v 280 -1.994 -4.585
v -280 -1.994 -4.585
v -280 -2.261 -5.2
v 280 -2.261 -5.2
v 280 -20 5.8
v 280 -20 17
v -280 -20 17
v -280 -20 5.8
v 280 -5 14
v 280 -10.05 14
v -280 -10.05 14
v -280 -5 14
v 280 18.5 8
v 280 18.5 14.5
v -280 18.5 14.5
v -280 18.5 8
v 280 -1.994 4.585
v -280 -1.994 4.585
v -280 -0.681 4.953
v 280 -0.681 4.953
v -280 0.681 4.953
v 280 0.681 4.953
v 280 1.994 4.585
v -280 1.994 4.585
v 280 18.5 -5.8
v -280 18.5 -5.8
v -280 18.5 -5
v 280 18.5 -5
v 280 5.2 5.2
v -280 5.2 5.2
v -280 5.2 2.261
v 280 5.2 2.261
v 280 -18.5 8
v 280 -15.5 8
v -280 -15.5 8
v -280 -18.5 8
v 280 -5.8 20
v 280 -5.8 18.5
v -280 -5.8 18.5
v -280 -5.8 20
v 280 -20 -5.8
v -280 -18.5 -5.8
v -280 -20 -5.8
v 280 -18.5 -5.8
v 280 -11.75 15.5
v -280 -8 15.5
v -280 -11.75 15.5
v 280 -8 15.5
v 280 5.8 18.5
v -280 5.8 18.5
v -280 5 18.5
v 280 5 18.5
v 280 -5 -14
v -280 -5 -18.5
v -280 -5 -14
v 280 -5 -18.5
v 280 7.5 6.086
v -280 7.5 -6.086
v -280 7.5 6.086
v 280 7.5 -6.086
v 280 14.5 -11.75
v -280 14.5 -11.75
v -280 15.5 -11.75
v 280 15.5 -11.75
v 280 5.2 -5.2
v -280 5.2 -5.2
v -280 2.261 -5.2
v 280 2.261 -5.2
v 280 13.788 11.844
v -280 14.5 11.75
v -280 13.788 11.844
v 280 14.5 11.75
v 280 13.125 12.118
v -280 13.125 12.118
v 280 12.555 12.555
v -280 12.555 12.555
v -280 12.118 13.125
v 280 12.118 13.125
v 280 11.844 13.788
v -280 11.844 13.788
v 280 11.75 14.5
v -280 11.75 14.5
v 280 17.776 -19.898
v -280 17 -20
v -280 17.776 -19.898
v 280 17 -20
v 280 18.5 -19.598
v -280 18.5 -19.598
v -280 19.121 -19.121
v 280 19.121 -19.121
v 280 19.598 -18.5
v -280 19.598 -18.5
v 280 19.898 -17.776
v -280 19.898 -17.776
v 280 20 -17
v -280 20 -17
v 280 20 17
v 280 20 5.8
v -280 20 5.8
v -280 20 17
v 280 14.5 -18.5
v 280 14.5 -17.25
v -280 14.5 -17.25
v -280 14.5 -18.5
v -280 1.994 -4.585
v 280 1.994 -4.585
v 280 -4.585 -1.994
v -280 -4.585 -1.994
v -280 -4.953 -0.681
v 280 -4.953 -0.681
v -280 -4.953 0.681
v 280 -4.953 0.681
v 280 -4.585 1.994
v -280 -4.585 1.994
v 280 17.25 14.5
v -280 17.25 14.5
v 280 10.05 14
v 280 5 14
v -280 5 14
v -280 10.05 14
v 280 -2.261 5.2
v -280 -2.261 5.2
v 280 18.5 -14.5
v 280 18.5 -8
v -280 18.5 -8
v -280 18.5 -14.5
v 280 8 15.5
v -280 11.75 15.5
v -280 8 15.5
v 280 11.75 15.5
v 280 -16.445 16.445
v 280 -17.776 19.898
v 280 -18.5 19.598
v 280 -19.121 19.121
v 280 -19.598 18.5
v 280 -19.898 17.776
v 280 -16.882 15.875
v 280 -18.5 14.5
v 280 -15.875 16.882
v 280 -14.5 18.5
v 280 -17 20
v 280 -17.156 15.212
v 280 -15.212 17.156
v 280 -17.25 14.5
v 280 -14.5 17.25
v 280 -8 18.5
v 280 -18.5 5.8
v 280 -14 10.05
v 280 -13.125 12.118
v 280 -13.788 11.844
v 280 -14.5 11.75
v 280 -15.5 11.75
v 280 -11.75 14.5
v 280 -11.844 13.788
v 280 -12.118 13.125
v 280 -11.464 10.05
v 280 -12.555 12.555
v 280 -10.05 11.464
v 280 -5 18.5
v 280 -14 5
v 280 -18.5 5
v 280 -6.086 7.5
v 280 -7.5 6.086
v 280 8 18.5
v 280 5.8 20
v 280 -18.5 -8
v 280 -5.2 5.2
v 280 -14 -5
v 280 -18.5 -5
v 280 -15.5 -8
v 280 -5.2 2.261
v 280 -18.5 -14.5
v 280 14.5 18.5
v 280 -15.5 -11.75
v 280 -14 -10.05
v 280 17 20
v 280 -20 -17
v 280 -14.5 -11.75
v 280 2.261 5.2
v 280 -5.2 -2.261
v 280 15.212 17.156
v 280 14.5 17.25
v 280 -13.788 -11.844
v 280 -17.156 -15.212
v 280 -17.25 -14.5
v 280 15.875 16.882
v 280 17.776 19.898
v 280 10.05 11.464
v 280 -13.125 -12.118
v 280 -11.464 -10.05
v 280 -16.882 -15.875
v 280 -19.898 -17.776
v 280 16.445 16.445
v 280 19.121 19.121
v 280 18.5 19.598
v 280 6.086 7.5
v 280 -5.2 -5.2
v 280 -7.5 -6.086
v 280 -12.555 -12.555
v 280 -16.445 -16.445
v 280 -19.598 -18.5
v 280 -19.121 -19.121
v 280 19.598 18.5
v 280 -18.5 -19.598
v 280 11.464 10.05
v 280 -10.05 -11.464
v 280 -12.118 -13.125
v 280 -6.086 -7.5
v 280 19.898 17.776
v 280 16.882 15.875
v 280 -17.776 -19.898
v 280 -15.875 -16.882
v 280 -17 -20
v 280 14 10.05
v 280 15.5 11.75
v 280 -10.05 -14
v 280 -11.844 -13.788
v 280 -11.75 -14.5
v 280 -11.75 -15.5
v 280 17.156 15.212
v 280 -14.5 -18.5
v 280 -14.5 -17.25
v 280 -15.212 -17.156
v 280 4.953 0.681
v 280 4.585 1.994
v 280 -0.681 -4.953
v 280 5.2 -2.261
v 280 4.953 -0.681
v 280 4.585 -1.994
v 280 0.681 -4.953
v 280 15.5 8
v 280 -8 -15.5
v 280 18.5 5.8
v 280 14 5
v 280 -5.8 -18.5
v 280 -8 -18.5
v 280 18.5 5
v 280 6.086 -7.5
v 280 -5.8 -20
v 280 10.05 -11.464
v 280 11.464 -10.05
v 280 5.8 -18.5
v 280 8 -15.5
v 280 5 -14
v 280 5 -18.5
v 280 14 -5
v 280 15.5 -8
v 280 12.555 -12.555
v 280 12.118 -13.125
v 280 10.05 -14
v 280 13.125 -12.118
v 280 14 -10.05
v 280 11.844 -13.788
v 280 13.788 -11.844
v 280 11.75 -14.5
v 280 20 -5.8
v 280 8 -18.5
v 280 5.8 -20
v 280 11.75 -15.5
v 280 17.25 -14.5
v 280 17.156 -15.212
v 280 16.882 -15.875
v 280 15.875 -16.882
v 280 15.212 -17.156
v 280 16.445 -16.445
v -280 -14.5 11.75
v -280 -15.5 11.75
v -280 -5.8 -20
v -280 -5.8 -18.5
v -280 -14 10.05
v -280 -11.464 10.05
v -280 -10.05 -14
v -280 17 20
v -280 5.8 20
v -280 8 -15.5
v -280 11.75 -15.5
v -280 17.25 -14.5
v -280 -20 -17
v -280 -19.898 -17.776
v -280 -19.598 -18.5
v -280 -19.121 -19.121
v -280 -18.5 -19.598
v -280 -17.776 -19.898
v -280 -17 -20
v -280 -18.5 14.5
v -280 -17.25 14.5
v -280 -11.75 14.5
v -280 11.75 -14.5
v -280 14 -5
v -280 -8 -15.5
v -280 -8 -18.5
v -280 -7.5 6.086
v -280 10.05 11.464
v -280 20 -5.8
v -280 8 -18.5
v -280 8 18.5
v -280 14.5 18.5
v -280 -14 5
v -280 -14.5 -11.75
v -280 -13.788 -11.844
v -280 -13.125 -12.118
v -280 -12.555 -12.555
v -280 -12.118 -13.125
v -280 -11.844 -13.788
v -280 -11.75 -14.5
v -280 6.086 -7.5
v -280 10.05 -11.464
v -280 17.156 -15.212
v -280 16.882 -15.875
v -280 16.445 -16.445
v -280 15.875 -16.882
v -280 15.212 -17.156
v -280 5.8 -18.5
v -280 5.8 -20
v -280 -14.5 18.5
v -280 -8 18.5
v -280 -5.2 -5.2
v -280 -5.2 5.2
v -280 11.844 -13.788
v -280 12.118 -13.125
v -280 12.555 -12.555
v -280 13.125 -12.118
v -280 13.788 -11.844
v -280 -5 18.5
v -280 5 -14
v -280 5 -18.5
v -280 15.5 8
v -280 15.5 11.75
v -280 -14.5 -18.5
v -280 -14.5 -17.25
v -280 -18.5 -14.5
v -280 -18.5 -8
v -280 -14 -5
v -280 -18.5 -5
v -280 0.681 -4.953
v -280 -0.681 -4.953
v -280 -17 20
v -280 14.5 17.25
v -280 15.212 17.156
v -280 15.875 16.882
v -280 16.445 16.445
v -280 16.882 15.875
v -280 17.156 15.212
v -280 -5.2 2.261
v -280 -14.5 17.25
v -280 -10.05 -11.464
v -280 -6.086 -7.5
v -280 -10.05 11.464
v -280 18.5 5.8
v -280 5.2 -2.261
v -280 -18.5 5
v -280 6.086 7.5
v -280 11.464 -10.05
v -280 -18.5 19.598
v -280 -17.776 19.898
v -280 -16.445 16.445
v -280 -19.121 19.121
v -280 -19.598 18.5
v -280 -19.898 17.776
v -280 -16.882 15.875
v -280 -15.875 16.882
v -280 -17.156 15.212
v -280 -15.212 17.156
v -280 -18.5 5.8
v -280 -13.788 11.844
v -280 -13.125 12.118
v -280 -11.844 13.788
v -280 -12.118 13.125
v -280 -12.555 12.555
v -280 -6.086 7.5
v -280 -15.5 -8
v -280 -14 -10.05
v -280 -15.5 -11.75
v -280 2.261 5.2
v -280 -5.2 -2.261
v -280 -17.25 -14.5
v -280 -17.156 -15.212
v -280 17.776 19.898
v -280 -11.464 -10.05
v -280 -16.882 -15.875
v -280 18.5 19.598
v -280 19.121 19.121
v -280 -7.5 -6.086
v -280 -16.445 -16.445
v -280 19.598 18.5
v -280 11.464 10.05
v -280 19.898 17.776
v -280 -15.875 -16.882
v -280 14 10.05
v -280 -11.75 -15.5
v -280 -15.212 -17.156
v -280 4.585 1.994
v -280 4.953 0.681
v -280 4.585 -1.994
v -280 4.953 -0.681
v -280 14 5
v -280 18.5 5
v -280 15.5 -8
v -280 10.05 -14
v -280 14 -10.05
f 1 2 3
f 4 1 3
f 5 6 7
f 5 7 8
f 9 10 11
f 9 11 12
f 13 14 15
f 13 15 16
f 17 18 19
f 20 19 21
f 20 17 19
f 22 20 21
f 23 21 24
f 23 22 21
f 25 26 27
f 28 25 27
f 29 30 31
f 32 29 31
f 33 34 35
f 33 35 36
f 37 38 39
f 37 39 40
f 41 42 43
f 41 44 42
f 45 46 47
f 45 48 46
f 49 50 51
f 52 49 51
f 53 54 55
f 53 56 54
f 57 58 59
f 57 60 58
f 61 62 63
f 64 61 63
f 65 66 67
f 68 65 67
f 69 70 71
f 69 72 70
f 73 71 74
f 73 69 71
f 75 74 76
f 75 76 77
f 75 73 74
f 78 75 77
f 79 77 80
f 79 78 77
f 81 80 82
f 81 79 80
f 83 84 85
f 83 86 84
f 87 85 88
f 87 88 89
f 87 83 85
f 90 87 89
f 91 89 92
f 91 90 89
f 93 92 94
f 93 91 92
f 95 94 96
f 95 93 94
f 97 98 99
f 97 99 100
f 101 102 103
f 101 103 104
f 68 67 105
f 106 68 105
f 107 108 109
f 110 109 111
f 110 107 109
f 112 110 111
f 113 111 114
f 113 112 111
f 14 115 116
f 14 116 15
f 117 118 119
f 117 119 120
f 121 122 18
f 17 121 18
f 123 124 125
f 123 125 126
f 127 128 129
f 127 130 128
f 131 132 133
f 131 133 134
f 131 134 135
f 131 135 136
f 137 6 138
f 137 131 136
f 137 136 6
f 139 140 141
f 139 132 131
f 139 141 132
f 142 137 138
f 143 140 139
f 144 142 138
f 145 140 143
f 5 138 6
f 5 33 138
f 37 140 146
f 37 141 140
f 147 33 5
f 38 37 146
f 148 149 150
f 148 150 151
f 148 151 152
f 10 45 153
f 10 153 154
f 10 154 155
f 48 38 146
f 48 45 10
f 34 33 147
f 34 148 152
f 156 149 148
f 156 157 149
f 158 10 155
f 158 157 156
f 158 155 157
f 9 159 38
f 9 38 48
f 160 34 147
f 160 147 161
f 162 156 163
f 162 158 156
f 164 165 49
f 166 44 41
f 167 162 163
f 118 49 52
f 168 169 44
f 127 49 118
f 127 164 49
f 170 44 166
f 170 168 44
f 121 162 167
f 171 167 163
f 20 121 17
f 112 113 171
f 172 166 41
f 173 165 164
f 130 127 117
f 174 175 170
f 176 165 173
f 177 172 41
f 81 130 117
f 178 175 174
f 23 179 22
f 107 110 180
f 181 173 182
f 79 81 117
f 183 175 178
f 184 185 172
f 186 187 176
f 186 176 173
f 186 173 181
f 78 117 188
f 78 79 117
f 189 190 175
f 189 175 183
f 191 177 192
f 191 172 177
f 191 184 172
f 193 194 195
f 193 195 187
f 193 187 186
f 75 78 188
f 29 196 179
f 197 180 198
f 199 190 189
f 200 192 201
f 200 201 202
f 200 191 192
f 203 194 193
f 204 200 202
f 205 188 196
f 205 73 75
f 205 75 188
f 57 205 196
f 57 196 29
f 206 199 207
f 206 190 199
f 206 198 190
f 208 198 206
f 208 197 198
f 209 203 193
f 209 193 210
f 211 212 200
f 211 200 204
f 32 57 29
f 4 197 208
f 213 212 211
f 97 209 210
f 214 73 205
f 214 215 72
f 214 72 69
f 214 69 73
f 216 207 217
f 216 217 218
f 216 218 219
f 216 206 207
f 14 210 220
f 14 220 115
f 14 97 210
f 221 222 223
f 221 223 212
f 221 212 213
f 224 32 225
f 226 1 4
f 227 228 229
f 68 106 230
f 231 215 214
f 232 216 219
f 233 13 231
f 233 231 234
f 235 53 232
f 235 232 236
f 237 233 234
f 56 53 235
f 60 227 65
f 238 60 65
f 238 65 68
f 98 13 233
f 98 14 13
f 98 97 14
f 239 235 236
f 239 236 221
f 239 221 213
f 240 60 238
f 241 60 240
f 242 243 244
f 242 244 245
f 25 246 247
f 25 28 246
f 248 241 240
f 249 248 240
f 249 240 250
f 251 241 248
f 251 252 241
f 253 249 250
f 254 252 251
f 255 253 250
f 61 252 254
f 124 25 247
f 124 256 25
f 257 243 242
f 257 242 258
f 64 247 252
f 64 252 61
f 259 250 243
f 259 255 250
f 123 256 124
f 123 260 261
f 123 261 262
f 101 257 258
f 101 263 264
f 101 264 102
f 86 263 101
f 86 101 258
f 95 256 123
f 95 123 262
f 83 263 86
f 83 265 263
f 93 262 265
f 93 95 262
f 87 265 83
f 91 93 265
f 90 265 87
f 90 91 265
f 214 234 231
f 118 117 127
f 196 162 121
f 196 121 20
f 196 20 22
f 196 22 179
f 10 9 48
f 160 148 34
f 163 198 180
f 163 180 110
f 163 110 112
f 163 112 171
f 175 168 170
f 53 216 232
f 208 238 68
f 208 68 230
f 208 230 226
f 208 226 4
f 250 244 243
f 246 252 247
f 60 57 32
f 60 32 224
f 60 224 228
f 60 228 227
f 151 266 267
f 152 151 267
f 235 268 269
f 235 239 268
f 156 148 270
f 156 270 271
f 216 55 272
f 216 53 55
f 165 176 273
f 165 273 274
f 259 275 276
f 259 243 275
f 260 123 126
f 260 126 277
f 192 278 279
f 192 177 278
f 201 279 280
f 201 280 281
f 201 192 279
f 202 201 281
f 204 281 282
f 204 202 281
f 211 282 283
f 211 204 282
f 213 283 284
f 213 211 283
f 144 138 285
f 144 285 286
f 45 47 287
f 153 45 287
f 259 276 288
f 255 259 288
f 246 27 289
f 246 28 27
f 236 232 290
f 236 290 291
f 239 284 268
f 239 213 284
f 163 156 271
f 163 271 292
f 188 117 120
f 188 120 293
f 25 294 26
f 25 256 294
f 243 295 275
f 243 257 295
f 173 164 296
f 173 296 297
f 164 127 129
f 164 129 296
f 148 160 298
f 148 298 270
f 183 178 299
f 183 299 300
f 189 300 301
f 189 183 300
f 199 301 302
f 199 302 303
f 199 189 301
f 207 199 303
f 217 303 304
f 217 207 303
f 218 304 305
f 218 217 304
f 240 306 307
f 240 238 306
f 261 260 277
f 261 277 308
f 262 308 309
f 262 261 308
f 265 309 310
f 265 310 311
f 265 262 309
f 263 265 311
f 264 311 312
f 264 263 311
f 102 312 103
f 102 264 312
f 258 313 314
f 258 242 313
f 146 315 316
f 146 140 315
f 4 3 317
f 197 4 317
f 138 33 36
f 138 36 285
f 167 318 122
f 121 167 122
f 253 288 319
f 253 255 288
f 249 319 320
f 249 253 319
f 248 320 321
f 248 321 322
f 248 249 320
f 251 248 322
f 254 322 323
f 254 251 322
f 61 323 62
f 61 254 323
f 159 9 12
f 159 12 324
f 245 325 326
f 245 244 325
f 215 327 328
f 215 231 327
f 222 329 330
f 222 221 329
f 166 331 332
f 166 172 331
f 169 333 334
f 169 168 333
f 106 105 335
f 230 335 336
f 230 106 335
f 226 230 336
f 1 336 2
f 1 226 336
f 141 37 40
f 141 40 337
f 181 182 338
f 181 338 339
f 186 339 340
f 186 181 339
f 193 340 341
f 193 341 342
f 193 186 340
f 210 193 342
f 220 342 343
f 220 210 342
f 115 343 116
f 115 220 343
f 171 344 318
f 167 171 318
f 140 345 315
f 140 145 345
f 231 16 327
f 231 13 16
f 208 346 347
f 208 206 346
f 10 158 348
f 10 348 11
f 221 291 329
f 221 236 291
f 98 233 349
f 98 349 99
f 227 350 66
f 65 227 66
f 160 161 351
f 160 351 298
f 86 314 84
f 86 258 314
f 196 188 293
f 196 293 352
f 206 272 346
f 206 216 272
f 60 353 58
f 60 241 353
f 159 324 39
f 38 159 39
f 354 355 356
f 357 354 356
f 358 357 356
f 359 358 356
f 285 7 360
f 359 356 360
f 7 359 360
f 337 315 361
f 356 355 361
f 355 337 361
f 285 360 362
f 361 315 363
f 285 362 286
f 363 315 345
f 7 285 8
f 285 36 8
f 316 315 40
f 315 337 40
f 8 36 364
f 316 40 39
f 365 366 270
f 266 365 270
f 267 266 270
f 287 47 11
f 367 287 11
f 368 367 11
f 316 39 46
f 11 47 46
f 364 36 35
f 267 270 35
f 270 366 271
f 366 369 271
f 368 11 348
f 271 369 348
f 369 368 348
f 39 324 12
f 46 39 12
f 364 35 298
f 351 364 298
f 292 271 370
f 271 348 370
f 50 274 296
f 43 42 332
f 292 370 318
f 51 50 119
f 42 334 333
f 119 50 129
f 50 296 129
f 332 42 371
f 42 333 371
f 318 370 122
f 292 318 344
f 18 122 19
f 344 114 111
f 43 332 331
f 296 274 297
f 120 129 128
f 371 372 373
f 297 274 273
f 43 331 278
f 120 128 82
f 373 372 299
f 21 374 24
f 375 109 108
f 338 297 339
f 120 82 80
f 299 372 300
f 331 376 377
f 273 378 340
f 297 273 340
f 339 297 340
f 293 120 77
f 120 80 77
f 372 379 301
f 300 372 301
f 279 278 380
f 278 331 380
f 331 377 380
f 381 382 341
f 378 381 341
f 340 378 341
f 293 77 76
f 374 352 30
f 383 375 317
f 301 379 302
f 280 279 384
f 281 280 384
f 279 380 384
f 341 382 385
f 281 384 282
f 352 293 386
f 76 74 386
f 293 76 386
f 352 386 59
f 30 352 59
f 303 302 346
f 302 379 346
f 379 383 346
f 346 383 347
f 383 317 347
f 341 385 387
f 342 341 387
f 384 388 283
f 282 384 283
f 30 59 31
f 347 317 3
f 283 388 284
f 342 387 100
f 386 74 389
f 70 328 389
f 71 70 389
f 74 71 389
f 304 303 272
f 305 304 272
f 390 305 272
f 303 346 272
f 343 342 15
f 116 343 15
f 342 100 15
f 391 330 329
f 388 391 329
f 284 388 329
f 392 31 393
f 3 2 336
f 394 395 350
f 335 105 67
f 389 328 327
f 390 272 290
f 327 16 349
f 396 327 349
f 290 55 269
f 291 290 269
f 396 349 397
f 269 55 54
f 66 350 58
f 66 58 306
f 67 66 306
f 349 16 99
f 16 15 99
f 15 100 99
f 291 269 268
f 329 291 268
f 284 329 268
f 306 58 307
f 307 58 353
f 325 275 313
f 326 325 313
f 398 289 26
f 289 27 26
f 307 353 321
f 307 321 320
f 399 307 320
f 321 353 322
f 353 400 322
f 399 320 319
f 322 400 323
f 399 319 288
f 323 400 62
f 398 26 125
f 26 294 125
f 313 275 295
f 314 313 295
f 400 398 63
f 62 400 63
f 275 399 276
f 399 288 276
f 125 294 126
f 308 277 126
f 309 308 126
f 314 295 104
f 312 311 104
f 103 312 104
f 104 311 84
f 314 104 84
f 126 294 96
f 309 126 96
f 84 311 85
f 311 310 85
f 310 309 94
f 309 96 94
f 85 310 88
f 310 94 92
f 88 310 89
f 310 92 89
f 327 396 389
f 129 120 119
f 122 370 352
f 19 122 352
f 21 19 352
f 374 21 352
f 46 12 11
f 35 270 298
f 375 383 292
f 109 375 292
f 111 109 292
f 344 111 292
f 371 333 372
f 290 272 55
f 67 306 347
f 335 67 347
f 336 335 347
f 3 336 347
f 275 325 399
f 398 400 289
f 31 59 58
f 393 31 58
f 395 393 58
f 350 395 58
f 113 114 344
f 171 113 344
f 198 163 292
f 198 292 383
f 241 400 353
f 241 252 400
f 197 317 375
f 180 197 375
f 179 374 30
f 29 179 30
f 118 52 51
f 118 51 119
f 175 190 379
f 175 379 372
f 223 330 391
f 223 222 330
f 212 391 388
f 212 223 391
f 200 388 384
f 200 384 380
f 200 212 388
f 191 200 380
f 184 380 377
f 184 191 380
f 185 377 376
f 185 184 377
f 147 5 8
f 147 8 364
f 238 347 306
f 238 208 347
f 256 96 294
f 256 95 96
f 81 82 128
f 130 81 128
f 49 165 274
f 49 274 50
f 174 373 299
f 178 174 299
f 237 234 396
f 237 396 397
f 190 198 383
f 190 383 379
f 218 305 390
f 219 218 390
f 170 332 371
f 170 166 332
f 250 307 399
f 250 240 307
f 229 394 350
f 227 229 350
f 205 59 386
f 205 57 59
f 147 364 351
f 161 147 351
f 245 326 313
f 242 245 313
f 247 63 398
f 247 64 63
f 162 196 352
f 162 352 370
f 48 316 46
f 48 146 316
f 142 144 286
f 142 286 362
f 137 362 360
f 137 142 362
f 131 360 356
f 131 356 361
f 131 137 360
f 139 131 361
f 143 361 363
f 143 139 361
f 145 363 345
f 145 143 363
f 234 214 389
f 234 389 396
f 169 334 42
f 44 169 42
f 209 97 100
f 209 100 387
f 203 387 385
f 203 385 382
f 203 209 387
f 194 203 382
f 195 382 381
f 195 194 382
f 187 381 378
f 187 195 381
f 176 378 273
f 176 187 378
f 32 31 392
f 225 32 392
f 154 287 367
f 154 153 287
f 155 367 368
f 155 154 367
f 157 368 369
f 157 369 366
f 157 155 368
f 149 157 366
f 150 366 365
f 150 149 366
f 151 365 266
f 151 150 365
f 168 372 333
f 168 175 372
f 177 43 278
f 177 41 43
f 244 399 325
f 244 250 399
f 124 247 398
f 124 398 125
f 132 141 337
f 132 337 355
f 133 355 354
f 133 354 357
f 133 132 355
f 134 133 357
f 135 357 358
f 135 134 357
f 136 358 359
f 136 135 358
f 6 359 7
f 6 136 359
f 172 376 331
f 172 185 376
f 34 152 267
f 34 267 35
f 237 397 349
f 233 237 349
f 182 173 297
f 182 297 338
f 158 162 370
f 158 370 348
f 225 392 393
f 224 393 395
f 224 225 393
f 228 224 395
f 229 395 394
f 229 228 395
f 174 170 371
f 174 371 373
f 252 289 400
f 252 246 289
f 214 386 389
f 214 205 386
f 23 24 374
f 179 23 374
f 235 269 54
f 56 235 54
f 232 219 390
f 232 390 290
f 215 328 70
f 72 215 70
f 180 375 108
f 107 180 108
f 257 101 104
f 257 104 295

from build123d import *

# Parameters (mm, degrees)
BR_EXTRUDE_DEPTH      = 280
BR_EXTRUDE_DEPTH_BACK = 280


with BuildPart() as part:
    # Sketch2 → BR_Extrude (new body, two sides)
    with BuildSketch(Plane(origin=(0, 0, 0), x_dir=(0, 0, -1), z_dir=(1, 0, 0))) as br_extrude_sk:
        with BuildLine():
            Line((-10.05, 11.464213562), (-10.05, 14))
            Line((-10.05, 14), (-5, 14))
            Line((-5, 14), (-5, 18.5))
            Line((-5, 18.5), (-5.8, 18.5))
            Line((-5.8, 18.5), (-5.8, 20))
            Line((-5.8, 20), (-17, 20))
            ThreePointArc((-17, 20), (-19.121320344, 19.121320344), (-20, 17))
            Line((-20, 17), (-20, 5.8))
            Line((-20, 5.8), (-18.5, 5.8))
            Line((-18.5, 5.8), (-18.5, 5))
            Line((-18.5, 5), (-14, 5))
            Line((-14, 5), (-14, 10.05))
            Line((-14, 10.05), (-11.464213562, 10.05))
            Line((-11.464213562, 10.05), (-7.5, 6.085786438))
            Line((-7.5, 6.085786438), (-7.5, -6.085786438))
            Line((-7.5, -6.085786438), (-11.464213562, -10.05))
            Line((-11.464213562, -10.05), (-14, -10.05))
            Line((-14, -10.05), (-14, -5))
            Line((-14, -5), (-18.5, -5))
            Line((-18.5, -5), (-18.5, -5.8))
            Line((-18.5, -5.8), (-20, -5.8))
            Line((-20, -5.8), (-20, -17))
            ThreePointArc((-20, -17), (-19.121320344, -19.121320344), (-17, -20))
            Line((-17, -20), (-5.8, -20))
            Line((-5.8, -20), (-5.8, -18.5))
            Line((-5.8, -18.5), (-5, -18.5))
            Line((-5, -18.5), (-5, -14))
            Line((-5, -14), (-10.05, -14))
            Line((-10.05, -14), (-10.05, -11.464213562))
            Line((-10.05, -11.464213562), (-6.085786438, -7.5))
            Line((-6.085786438, -7.5), (6.085786438, -7.5))
            Line((6.085786438, -7.5), (10.05, -11.464213562))
            Line((10.05, -11.464213562), (10.05, -14))
            Line((10.05, -14), (5, -14))
            Line((5, -14), (5, -18.5))
            Line((5, -18.5), (5.8, -18.5))
            Line((5.8, -18.5), (5.8, -20))
            Line((5.8, -20), (17, -20))
            ThreePointArc((17, -20), (19.121320344, -19.121320344), (20, -17))
            Line((20, -17), (20, -5.8))
            Line((20, -5.8), (18.5, -5.8))
            Line((18.5, -5.8), (18.5, -5))
            Line((18.5, -5), (14, -5))
            Line((14, -5), (14, -10.05))
            Line((14, -10.05), (11.464213562, -10.05))
            Line((11.464213562, -10.05), (7.5, -6.085786438))
            Line((7.5, -6.085786438), (7.5, 6.085786438))
            Line((7.5, 6.085786438), (11.464213562, 10.05))
            Line((11.464213562, 10.05), (14, 10.05))
            Line((14, 10.05), (14, 5))
            Line((14, 5), (18.5, 5))
            Line((18.5, 5), (18.5, 5.8))
            Line((18.5, 5.8), (20, 5.8))
            Line((20, 5.8), (20, 17))
            ThreePointArc((20, 17), (19.121320344, 19.121320344), (17, 20))
            Line((17, 20), (5.8, 20))
            Line((5.8, 20), (5.8, 18.5))
            Line((5.8, 18.5), (5, 18.5))
            Line((5, 18.5), (5, 14))
            Line((5, 14), (10.05, 14))
            Line((10.05, 14), (10.05, 11.464213562))
            Line((10.05, 11.464213562), (6.085786438, 7.5))
            Line((6.085786438, 7.5), (-6.085786438, 7.5))
            Line((-6.085786438, 7.5), (-10.05, 11.464213562))
        make_face()
        with BuildLine():
            Line((8, 15.5), (8, 18.5))
            Line((8, 18.5), (14.5, 18.5))
            Line((14.5, 18.5), (14.5, 17.25))
            ThreePointArc((14.5, 17.25), (16.444543648, 16.444543648), (17.25, 14.5))
            Line((17.25, 14.5), (18.5, 14.5))
            Line((18.5, 14.5), (18.5, 8))
            Line((18.5, 8), (15.5, 8))
            Line((15.5, 8), (15.5, 11.75))
            Line((15.5, 11.75), (14.5, 11.75))
            ThreePointArc((14.5, 11.75), (12.555456352, 12.555456352), (11.75, 14.5))
            Line((11.75, 14.5), (11.75, 15.5))
            Line((11.75, 15.5), (8, 15.5))
        make_face(mode=Mode.SUBTRACT)
        with BuildLine():
            Line((8, -15.5), (11.75, -15.5))
            Line((11.75, -15.5), (11.75, -14.5))
            ThreePointArc((11.75, -14.5), (12.555456352, -12.555456352), (14.5, -11.75))
            Line((14.5, -11.75), (15.5, -11.75))
            Line((15.5, -11.75), (15.5, -8))
            Line((15.5, -8), (18.5, -8))
            Line((18.5, -8), (18.5, -14.5))
            Line((18.5, -14.5), (17.25, -14.5))
            ThreePointArc((17.25, -14.5), (16.444543648, -16.444543648), (14.5, -17.25))
            Line((14.5, -17.25), (14.5, -18.5))
            Line((14.5, -18.5), (8, -18.5))
            Line((8, -18.5), (8, -15.5))
        make_face(mode=Mode.SUBTRACT)
        with BuildLine():
            Line((-15.5, 8), (-18.5, 8))
            Line((-18.5, 8), (-18.5, 14.5))
            Line((-18.5, 14.5), (-17.25, 14.5))
            ThreePointArc((-17.25, 14.5), (-16.444543648, 16.444543648), (-14.5, 17.25))
            Line((-14.5, 17.25), (-14.5, 18.5))
            Line((-14.5, 18.5), (-8, 18.5))
            Line((-8, 18.5), (-8, 15.5))
            Line((-8, 15.5), (-11.75, 15.5))
            Line((-11.75, 15.5), (-11.75, 14.5))
            ThreePointArc((-11.75, 14.5), (-12.555456352, 12.555456352), (-14.5, 11.75))
            Line((-14.5, 11.75), (-15.5, 11.75))
            Line((-15.5, 11.75), (-15.5, 8))
        make_face(mode=Mode.SUBTRACT)
        with BuildLine():
            Line((-11.75, -14.5), (-11.75, -15.5))
            Line((-11.75, -15.5), (-8, -15.5))
            Line((-8, -15.5), (-8, -18.5))
            Line((-8, -18.5), (-14.5, -18.5))
            Line((-14.5, -18.5), (-14.5, -17.25))
            ThreePointArc((-14.5, -17.25), (-16.444543648, -16.444543648), (-17.25, -14.5))
            Line((-17.25, -14.5), (-18.5, -14.5))
            Line((-18.5, -14.5), (-18.5, -8))
            Line((-18.5, -8), (-15.5, -8))
            Line((-15.5, -8), (-15.5, -11.75))
            Line((-15.5, -11.75), (-14.5, -11.75))
            ThreePointArc((-14.5, -11.75), (-12.555456352, -12.555456352), (-11.75, -14.5))
        make_face(mode=Mode.SUBTRACT)
        with BuildLine():
            Line((-5.2, -5.2), (-5.2, -2.26102435))
            Line((-5.2, -2.26102435), (-4.585300372, -1.993745345))
            ThreePointArc((-4.585300372, -1.993745345), (-5, 0), (-4.585300372, 1.993745345))
            Line((-4.585300372, 1.993745345), (-5.2, 2.26102435))
            Line((-5.2, 2.26102435), (-5.2, 5.2))
            Line((-5.2, 5.2), (-2.26102435, 5.2))
            Line((-2.26102435, 5.2), (-1.993745345, 4.585300372))
            ThreePointArc((-1.993745345, 4.585300372), (0, 5), (1.993745345, 4.585300372))
            Line((1.993745345, 4.585300372), (2.26102435, 5.2))
            Line((2.26102435, 5.2), (5.2, 5.2))
            Line((5.2, 5.2), (5.2, 2.26102435))
            Line((5.2, 2.26102435), (4.585300372, 1.993745345))
            ThreePointArc((4.585300372, 1.993745345), (5, 0), (4.585300372, -1.993745345))
            Line((4.585300372, -1.993745345), (5.2, -2.26102435))
            Line((5.2, -2.26102435), (5.2, -5.2))
            Line((5.2, -5.2), (2.26102435, -5.2))
            Line((2.26102435, -5.2), (1.993745345, -4.585300372))
            ThreePointArc((1.993745345, -4.585300372), (0, -5), (-1.993745345, -4.585300372))
            Line((-1.993745345, -4.585300372), (-2.26102435, -5.2))
            Line((-2.26102435, -5.2), (-5.2, -5.2))
        make_face(mode=Mode.SUBTRACT)
    extrude(amount=BR_EXTRUDE_DEPTH)
    extrude(br_extrude_sk.sketch, amount=-BR_EXTRUDE_DEPTH_BACK)


solid = part.part
